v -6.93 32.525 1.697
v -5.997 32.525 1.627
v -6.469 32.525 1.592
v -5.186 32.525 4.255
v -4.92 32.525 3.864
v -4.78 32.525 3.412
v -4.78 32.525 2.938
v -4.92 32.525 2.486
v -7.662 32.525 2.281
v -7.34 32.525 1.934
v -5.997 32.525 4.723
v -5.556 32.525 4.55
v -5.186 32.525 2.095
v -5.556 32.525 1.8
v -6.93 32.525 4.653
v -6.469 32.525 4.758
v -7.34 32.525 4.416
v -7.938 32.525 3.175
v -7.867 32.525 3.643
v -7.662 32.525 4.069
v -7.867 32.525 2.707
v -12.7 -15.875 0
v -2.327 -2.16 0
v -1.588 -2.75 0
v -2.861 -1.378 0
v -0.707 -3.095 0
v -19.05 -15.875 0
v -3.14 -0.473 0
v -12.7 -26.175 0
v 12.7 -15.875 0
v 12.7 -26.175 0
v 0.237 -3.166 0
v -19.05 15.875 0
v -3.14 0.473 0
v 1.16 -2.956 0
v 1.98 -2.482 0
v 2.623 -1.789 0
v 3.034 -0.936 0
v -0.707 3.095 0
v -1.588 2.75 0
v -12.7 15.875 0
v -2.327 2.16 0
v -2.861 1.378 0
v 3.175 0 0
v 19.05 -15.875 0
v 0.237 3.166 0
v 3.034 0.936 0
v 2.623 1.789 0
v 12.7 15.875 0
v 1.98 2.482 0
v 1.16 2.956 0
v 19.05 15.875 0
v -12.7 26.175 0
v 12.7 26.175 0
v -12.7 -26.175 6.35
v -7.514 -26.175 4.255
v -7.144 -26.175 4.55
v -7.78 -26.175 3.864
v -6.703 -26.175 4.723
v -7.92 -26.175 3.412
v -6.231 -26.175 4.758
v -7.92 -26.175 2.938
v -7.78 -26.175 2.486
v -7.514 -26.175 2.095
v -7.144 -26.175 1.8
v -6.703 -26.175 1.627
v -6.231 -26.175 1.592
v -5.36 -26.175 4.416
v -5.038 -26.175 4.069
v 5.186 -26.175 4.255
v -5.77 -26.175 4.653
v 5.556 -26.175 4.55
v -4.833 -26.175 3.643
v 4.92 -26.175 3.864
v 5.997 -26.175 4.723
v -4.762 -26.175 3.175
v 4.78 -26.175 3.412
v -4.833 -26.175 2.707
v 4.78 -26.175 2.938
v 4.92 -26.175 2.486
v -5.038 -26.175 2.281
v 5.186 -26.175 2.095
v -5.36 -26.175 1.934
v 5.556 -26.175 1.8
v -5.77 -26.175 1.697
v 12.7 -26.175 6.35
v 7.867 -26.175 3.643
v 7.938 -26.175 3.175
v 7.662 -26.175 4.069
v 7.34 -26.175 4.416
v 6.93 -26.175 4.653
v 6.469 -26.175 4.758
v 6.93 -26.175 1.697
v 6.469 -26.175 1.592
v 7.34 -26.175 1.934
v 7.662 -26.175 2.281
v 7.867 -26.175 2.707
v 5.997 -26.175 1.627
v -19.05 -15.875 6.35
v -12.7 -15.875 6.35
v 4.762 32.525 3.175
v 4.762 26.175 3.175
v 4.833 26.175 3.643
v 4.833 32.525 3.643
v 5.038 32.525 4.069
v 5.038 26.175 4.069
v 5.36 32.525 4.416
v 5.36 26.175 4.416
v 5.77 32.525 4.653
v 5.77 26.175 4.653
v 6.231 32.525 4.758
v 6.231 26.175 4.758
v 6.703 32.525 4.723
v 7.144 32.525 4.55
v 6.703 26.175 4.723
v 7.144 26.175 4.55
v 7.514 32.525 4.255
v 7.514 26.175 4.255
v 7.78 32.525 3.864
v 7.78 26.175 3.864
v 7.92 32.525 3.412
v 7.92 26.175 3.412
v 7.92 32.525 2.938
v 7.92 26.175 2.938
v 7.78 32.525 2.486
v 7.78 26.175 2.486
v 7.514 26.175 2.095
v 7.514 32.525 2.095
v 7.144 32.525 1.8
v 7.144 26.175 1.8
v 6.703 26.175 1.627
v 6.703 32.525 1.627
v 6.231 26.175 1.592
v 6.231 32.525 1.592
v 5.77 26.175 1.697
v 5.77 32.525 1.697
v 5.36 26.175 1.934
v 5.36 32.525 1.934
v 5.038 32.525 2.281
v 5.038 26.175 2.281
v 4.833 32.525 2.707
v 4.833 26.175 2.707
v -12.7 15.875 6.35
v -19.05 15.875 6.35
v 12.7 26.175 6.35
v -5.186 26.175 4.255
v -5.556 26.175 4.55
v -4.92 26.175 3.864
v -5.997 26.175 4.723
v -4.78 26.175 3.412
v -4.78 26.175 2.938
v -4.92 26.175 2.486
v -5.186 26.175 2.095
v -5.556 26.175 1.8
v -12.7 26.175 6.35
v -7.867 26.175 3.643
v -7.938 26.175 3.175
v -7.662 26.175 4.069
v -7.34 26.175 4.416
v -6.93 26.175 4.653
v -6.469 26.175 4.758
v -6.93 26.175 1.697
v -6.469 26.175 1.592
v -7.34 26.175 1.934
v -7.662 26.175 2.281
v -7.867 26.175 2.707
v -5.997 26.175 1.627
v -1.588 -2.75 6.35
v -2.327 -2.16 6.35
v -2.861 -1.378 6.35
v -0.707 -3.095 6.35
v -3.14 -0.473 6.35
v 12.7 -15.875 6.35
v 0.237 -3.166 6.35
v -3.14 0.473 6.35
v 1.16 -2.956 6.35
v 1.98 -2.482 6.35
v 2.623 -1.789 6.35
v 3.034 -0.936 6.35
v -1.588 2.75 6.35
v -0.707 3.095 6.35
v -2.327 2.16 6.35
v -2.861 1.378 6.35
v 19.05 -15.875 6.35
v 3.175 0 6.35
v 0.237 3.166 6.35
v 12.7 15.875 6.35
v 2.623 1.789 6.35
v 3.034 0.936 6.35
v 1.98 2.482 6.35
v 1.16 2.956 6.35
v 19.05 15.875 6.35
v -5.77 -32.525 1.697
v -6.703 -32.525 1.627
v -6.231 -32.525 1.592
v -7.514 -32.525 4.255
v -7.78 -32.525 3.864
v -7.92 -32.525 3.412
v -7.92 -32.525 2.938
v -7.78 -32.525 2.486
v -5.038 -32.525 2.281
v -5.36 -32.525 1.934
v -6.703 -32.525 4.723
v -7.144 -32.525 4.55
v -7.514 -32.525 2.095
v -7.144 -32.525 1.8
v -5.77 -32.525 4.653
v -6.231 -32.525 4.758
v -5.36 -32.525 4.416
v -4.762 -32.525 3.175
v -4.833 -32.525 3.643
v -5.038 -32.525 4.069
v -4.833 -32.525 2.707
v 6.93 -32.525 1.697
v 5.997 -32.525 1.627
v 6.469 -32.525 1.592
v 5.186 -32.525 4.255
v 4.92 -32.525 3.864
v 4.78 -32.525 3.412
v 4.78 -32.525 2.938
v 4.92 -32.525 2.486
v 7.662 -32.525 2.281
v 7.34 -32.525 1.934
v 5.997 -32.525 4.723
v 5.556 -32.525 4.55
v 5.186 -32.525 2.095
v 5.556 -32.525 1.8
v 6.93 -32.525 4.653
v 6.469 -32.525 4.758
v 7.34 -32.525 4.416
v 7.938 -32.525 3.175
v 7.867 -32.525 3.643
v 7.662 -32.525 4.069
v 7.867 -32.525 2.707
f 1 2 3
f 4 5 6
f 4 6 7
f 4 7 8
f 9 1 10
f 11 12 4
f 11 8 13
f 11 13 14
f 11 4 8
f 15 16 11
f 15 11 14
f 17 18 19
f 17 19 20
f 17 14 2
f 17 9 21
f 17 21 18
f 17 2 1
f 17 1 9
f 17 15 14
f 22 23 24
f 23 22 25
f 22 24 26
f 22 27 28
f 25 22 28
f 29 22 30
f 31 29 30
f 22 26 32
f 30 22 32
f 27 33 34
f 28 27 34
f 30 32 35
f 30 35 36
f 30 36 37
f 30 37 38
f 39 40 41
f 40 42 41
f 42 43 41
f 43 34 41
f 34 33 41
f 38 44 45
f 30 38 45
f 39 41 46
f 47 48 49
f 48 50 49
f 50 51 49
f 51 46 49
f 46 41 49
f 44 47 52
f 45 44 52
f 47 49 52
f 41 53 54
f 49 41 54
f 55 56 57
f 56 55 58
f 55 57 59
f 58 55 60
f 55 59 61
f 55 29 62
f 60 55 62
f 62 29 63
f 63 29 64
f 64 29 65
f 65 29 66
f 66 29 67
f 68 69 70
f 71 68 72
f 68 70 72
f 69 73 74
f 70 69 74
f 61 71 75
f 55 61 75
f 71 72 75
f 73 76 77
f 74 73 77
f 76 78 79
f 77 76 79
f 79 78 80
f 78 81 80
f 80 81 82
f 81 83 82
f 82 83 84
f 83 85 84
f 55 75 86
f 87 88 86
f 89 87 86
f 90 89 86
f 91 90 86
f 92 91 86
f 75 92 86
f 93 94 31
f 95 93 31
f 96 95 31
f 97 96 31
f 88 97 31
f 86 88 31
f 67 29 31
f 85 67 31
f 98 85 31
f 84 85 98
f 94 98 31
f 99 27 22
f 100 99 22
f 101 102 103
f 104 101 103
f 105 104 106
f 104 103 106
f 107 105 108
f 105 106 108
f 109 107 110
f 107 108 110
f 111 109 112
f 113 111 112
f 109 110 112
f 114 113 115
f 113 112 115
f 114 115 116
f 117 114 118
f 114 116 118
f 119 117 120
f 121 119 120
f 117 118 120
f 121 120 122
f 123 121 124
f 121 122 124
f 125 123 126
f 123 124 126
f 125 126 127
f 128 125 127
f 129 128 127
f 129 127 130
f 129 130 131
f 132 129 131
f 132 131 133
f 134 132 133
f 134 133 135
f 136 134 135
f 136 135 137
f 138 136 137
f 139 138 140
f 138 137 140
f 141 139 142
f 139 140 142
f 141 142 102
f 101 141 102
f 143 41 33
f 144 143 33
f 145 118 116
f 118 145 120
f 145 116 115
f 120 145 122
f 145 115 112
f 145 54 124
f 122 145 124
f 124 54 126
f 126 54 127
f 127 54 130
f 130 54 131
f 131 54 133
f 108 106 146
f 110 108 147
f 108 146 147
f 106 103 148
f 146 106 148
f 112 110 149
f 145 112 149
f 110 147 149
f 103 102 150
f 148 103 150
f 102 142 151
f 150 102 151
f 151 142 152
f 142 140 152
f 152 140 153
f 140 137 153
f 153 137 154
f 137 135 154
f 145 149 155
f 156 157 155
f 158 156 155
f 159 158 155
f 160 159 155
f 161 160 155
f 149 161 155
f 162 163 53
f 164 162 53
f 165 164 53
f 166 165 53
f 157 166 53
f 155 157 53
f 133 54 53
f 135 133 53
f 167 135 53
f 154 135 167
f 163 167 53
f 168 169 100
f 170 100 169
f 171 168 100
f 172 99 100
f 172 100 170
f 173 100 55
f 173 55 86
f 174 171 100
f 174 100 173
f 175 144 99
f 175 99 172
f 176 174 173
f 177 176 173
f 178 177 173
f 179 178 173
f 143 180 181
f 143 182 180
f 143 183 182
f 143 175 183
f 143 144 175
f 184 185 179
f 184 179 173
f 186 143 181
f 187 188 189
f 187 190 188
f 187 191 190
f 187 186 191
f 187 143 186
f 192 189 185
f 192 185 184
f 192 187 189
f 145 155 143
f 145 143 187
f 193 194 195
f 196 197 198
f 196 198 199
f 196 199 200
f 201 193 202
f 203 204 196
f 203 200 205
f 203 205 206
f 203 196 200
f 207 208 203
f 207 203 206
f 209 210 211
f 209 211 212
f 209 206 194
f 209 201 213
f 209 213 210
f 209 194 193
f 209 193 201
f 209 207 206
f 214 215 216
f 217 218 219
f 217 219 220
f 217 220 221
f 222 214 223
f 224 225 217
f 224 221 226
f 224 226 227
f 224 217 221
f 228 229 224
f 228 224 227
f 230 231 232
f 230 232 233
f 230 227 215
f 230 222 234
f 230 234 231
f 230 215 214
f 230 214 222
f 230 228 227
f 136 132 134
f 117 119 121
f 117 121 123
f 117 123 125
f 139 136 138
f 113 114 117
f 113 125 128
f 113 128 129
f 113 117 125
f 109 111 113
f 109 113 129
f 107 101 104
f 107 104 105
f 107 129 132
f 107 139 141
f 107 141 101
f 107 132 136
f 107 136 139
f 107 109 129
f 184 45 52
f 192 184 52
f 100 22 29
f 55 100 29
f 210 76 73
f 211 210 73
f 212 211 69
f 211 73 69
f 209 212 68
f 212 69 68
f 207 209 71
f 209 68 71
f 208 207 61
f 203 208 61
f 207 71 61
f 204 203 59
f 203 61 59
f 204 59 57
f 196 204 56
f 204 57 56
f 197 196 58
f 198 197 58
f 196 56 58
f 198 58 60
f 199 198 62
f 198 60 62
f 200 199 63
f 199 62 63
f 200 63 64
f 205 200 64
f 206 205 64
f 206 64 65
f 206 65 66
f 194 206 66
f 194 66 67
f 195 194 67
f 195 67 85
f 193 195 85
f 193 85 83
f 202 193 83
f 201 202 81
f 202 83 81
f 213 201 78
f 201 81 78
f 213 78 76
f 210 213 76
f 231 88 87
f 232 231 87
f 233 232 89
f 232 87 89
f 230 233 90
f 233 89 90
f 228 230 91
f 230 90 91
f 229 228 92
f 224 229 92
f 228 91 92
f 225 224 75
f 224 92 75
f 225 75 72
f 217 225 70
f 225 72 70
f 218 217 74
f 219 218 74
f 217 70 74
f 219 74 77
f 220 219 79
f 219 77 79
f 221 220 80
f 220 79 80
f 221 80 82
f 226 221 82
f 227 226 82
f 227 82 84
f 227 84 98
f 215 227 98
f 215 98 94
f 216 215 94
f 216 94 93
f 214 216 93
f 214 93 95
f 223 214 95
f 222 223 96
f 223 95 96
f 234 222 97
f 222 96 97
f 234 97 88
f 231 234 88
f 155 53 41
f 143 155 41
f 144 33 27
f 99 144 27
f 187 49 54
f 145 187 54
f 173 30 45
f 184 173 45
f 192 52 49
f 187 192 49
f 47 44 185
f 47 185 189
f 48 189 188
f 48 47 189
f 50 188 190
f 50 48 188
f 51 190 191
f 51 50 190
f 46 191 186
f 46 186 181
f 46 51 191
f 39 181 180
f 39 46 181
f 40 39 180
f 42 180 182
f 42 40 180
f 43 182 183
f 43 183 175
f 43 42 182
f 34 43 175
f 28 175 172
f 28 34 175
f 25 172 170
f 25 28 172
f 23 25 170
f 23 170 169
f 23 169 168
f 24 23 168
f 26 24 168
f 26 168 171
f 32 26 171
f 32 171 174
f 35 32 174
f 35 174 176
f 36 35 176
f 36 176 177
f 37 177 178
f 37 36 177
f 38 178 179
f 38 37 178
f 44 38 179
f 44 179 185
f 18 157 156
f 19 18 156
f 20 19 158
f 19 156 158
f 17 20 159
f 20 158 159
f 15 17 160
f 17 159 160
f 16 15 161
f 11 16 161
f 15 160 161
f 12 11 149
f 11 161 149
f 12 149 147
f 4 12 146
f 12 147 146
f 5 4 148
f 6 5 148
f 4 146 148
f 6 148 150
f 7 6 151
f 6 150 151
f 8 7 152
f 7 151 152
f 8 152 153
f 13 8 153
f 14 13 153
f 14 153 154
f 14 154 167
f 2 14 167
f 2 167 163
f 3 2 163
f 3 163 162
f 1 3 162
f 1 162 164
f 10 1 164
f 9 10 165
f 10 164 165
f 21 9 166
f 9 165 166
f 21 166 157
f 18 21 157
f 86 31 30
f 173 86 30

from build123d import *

# Parameters (mm, degrees)
F0_R     = 3.175
F1_DEPTH = 6.35
F2_R     = 1.5875
F3_DEPTH = 6.35
F4_DEPTH = 6.35
F5_R     = 1.5875
F6_DEPTH = 6.35
F7_DEPTH = 6.35


with BuildPart() as f1:
    # F0 (on Top) → F1 (new body)
    with BuildSketch(Plane.XY):
        Polygon((12.7, 15.875), (12.7, 26.1747), (-12.7, 26.1747), (-12.7, 15.875), (-19.05, 15.875), (-19.05, -15.875), (-12.7, -15.875), (-12.7, -26.1747), (12.7, -26.1747), (12.7, -15.875), (19.05, -15.875), (19.05, 15.875), align=None)
        Circle(F0_R, mode=Mode.SUBTRACT)
    extrude(amount=F1_DEPTH)

    # F2 (on face) → F3 (join)
    with BuildSketch(Plane(origin=(0, 26.1747, 0), x_dir=(-1, 0, 0), z_dir=(0, 1, 0))):
        with Locations((-6.35, 3.175)):
            Circle(F2_R)
    extrude(amount=F3_DEPTH)

    # F2 (on face) → F4 (join)
    with BuildSketch(Plane(origin=(0, 26.1747, 0), x_dir=(-1, 0, 0), z_dir=(0, 1, 0))):
        with Locations((6.35, 3.175)):
            Circle(F2_R)
    extrude(amount=F4_DEPTH)

    # F5 (on face) → F6 (join)
    with BuildSketch(Plane.XZ.offset(26.1747)):
        with Locations((-6.35, 3.175)):
            Circle(F5_R)
    extrude(amount=F6_DEPTH)

    # F5 (on face) → F7 (join)
    with BuildSketch(Plane.XZ.offset(26.1747)):
        with Locations((-6.35, 3.175)):
            Circle(F5_R)
        with Locations((6.35, 3.175)):
            Circle(F5_R)
    extrude(amount=F7_DEPTH)


solid = f1.part
